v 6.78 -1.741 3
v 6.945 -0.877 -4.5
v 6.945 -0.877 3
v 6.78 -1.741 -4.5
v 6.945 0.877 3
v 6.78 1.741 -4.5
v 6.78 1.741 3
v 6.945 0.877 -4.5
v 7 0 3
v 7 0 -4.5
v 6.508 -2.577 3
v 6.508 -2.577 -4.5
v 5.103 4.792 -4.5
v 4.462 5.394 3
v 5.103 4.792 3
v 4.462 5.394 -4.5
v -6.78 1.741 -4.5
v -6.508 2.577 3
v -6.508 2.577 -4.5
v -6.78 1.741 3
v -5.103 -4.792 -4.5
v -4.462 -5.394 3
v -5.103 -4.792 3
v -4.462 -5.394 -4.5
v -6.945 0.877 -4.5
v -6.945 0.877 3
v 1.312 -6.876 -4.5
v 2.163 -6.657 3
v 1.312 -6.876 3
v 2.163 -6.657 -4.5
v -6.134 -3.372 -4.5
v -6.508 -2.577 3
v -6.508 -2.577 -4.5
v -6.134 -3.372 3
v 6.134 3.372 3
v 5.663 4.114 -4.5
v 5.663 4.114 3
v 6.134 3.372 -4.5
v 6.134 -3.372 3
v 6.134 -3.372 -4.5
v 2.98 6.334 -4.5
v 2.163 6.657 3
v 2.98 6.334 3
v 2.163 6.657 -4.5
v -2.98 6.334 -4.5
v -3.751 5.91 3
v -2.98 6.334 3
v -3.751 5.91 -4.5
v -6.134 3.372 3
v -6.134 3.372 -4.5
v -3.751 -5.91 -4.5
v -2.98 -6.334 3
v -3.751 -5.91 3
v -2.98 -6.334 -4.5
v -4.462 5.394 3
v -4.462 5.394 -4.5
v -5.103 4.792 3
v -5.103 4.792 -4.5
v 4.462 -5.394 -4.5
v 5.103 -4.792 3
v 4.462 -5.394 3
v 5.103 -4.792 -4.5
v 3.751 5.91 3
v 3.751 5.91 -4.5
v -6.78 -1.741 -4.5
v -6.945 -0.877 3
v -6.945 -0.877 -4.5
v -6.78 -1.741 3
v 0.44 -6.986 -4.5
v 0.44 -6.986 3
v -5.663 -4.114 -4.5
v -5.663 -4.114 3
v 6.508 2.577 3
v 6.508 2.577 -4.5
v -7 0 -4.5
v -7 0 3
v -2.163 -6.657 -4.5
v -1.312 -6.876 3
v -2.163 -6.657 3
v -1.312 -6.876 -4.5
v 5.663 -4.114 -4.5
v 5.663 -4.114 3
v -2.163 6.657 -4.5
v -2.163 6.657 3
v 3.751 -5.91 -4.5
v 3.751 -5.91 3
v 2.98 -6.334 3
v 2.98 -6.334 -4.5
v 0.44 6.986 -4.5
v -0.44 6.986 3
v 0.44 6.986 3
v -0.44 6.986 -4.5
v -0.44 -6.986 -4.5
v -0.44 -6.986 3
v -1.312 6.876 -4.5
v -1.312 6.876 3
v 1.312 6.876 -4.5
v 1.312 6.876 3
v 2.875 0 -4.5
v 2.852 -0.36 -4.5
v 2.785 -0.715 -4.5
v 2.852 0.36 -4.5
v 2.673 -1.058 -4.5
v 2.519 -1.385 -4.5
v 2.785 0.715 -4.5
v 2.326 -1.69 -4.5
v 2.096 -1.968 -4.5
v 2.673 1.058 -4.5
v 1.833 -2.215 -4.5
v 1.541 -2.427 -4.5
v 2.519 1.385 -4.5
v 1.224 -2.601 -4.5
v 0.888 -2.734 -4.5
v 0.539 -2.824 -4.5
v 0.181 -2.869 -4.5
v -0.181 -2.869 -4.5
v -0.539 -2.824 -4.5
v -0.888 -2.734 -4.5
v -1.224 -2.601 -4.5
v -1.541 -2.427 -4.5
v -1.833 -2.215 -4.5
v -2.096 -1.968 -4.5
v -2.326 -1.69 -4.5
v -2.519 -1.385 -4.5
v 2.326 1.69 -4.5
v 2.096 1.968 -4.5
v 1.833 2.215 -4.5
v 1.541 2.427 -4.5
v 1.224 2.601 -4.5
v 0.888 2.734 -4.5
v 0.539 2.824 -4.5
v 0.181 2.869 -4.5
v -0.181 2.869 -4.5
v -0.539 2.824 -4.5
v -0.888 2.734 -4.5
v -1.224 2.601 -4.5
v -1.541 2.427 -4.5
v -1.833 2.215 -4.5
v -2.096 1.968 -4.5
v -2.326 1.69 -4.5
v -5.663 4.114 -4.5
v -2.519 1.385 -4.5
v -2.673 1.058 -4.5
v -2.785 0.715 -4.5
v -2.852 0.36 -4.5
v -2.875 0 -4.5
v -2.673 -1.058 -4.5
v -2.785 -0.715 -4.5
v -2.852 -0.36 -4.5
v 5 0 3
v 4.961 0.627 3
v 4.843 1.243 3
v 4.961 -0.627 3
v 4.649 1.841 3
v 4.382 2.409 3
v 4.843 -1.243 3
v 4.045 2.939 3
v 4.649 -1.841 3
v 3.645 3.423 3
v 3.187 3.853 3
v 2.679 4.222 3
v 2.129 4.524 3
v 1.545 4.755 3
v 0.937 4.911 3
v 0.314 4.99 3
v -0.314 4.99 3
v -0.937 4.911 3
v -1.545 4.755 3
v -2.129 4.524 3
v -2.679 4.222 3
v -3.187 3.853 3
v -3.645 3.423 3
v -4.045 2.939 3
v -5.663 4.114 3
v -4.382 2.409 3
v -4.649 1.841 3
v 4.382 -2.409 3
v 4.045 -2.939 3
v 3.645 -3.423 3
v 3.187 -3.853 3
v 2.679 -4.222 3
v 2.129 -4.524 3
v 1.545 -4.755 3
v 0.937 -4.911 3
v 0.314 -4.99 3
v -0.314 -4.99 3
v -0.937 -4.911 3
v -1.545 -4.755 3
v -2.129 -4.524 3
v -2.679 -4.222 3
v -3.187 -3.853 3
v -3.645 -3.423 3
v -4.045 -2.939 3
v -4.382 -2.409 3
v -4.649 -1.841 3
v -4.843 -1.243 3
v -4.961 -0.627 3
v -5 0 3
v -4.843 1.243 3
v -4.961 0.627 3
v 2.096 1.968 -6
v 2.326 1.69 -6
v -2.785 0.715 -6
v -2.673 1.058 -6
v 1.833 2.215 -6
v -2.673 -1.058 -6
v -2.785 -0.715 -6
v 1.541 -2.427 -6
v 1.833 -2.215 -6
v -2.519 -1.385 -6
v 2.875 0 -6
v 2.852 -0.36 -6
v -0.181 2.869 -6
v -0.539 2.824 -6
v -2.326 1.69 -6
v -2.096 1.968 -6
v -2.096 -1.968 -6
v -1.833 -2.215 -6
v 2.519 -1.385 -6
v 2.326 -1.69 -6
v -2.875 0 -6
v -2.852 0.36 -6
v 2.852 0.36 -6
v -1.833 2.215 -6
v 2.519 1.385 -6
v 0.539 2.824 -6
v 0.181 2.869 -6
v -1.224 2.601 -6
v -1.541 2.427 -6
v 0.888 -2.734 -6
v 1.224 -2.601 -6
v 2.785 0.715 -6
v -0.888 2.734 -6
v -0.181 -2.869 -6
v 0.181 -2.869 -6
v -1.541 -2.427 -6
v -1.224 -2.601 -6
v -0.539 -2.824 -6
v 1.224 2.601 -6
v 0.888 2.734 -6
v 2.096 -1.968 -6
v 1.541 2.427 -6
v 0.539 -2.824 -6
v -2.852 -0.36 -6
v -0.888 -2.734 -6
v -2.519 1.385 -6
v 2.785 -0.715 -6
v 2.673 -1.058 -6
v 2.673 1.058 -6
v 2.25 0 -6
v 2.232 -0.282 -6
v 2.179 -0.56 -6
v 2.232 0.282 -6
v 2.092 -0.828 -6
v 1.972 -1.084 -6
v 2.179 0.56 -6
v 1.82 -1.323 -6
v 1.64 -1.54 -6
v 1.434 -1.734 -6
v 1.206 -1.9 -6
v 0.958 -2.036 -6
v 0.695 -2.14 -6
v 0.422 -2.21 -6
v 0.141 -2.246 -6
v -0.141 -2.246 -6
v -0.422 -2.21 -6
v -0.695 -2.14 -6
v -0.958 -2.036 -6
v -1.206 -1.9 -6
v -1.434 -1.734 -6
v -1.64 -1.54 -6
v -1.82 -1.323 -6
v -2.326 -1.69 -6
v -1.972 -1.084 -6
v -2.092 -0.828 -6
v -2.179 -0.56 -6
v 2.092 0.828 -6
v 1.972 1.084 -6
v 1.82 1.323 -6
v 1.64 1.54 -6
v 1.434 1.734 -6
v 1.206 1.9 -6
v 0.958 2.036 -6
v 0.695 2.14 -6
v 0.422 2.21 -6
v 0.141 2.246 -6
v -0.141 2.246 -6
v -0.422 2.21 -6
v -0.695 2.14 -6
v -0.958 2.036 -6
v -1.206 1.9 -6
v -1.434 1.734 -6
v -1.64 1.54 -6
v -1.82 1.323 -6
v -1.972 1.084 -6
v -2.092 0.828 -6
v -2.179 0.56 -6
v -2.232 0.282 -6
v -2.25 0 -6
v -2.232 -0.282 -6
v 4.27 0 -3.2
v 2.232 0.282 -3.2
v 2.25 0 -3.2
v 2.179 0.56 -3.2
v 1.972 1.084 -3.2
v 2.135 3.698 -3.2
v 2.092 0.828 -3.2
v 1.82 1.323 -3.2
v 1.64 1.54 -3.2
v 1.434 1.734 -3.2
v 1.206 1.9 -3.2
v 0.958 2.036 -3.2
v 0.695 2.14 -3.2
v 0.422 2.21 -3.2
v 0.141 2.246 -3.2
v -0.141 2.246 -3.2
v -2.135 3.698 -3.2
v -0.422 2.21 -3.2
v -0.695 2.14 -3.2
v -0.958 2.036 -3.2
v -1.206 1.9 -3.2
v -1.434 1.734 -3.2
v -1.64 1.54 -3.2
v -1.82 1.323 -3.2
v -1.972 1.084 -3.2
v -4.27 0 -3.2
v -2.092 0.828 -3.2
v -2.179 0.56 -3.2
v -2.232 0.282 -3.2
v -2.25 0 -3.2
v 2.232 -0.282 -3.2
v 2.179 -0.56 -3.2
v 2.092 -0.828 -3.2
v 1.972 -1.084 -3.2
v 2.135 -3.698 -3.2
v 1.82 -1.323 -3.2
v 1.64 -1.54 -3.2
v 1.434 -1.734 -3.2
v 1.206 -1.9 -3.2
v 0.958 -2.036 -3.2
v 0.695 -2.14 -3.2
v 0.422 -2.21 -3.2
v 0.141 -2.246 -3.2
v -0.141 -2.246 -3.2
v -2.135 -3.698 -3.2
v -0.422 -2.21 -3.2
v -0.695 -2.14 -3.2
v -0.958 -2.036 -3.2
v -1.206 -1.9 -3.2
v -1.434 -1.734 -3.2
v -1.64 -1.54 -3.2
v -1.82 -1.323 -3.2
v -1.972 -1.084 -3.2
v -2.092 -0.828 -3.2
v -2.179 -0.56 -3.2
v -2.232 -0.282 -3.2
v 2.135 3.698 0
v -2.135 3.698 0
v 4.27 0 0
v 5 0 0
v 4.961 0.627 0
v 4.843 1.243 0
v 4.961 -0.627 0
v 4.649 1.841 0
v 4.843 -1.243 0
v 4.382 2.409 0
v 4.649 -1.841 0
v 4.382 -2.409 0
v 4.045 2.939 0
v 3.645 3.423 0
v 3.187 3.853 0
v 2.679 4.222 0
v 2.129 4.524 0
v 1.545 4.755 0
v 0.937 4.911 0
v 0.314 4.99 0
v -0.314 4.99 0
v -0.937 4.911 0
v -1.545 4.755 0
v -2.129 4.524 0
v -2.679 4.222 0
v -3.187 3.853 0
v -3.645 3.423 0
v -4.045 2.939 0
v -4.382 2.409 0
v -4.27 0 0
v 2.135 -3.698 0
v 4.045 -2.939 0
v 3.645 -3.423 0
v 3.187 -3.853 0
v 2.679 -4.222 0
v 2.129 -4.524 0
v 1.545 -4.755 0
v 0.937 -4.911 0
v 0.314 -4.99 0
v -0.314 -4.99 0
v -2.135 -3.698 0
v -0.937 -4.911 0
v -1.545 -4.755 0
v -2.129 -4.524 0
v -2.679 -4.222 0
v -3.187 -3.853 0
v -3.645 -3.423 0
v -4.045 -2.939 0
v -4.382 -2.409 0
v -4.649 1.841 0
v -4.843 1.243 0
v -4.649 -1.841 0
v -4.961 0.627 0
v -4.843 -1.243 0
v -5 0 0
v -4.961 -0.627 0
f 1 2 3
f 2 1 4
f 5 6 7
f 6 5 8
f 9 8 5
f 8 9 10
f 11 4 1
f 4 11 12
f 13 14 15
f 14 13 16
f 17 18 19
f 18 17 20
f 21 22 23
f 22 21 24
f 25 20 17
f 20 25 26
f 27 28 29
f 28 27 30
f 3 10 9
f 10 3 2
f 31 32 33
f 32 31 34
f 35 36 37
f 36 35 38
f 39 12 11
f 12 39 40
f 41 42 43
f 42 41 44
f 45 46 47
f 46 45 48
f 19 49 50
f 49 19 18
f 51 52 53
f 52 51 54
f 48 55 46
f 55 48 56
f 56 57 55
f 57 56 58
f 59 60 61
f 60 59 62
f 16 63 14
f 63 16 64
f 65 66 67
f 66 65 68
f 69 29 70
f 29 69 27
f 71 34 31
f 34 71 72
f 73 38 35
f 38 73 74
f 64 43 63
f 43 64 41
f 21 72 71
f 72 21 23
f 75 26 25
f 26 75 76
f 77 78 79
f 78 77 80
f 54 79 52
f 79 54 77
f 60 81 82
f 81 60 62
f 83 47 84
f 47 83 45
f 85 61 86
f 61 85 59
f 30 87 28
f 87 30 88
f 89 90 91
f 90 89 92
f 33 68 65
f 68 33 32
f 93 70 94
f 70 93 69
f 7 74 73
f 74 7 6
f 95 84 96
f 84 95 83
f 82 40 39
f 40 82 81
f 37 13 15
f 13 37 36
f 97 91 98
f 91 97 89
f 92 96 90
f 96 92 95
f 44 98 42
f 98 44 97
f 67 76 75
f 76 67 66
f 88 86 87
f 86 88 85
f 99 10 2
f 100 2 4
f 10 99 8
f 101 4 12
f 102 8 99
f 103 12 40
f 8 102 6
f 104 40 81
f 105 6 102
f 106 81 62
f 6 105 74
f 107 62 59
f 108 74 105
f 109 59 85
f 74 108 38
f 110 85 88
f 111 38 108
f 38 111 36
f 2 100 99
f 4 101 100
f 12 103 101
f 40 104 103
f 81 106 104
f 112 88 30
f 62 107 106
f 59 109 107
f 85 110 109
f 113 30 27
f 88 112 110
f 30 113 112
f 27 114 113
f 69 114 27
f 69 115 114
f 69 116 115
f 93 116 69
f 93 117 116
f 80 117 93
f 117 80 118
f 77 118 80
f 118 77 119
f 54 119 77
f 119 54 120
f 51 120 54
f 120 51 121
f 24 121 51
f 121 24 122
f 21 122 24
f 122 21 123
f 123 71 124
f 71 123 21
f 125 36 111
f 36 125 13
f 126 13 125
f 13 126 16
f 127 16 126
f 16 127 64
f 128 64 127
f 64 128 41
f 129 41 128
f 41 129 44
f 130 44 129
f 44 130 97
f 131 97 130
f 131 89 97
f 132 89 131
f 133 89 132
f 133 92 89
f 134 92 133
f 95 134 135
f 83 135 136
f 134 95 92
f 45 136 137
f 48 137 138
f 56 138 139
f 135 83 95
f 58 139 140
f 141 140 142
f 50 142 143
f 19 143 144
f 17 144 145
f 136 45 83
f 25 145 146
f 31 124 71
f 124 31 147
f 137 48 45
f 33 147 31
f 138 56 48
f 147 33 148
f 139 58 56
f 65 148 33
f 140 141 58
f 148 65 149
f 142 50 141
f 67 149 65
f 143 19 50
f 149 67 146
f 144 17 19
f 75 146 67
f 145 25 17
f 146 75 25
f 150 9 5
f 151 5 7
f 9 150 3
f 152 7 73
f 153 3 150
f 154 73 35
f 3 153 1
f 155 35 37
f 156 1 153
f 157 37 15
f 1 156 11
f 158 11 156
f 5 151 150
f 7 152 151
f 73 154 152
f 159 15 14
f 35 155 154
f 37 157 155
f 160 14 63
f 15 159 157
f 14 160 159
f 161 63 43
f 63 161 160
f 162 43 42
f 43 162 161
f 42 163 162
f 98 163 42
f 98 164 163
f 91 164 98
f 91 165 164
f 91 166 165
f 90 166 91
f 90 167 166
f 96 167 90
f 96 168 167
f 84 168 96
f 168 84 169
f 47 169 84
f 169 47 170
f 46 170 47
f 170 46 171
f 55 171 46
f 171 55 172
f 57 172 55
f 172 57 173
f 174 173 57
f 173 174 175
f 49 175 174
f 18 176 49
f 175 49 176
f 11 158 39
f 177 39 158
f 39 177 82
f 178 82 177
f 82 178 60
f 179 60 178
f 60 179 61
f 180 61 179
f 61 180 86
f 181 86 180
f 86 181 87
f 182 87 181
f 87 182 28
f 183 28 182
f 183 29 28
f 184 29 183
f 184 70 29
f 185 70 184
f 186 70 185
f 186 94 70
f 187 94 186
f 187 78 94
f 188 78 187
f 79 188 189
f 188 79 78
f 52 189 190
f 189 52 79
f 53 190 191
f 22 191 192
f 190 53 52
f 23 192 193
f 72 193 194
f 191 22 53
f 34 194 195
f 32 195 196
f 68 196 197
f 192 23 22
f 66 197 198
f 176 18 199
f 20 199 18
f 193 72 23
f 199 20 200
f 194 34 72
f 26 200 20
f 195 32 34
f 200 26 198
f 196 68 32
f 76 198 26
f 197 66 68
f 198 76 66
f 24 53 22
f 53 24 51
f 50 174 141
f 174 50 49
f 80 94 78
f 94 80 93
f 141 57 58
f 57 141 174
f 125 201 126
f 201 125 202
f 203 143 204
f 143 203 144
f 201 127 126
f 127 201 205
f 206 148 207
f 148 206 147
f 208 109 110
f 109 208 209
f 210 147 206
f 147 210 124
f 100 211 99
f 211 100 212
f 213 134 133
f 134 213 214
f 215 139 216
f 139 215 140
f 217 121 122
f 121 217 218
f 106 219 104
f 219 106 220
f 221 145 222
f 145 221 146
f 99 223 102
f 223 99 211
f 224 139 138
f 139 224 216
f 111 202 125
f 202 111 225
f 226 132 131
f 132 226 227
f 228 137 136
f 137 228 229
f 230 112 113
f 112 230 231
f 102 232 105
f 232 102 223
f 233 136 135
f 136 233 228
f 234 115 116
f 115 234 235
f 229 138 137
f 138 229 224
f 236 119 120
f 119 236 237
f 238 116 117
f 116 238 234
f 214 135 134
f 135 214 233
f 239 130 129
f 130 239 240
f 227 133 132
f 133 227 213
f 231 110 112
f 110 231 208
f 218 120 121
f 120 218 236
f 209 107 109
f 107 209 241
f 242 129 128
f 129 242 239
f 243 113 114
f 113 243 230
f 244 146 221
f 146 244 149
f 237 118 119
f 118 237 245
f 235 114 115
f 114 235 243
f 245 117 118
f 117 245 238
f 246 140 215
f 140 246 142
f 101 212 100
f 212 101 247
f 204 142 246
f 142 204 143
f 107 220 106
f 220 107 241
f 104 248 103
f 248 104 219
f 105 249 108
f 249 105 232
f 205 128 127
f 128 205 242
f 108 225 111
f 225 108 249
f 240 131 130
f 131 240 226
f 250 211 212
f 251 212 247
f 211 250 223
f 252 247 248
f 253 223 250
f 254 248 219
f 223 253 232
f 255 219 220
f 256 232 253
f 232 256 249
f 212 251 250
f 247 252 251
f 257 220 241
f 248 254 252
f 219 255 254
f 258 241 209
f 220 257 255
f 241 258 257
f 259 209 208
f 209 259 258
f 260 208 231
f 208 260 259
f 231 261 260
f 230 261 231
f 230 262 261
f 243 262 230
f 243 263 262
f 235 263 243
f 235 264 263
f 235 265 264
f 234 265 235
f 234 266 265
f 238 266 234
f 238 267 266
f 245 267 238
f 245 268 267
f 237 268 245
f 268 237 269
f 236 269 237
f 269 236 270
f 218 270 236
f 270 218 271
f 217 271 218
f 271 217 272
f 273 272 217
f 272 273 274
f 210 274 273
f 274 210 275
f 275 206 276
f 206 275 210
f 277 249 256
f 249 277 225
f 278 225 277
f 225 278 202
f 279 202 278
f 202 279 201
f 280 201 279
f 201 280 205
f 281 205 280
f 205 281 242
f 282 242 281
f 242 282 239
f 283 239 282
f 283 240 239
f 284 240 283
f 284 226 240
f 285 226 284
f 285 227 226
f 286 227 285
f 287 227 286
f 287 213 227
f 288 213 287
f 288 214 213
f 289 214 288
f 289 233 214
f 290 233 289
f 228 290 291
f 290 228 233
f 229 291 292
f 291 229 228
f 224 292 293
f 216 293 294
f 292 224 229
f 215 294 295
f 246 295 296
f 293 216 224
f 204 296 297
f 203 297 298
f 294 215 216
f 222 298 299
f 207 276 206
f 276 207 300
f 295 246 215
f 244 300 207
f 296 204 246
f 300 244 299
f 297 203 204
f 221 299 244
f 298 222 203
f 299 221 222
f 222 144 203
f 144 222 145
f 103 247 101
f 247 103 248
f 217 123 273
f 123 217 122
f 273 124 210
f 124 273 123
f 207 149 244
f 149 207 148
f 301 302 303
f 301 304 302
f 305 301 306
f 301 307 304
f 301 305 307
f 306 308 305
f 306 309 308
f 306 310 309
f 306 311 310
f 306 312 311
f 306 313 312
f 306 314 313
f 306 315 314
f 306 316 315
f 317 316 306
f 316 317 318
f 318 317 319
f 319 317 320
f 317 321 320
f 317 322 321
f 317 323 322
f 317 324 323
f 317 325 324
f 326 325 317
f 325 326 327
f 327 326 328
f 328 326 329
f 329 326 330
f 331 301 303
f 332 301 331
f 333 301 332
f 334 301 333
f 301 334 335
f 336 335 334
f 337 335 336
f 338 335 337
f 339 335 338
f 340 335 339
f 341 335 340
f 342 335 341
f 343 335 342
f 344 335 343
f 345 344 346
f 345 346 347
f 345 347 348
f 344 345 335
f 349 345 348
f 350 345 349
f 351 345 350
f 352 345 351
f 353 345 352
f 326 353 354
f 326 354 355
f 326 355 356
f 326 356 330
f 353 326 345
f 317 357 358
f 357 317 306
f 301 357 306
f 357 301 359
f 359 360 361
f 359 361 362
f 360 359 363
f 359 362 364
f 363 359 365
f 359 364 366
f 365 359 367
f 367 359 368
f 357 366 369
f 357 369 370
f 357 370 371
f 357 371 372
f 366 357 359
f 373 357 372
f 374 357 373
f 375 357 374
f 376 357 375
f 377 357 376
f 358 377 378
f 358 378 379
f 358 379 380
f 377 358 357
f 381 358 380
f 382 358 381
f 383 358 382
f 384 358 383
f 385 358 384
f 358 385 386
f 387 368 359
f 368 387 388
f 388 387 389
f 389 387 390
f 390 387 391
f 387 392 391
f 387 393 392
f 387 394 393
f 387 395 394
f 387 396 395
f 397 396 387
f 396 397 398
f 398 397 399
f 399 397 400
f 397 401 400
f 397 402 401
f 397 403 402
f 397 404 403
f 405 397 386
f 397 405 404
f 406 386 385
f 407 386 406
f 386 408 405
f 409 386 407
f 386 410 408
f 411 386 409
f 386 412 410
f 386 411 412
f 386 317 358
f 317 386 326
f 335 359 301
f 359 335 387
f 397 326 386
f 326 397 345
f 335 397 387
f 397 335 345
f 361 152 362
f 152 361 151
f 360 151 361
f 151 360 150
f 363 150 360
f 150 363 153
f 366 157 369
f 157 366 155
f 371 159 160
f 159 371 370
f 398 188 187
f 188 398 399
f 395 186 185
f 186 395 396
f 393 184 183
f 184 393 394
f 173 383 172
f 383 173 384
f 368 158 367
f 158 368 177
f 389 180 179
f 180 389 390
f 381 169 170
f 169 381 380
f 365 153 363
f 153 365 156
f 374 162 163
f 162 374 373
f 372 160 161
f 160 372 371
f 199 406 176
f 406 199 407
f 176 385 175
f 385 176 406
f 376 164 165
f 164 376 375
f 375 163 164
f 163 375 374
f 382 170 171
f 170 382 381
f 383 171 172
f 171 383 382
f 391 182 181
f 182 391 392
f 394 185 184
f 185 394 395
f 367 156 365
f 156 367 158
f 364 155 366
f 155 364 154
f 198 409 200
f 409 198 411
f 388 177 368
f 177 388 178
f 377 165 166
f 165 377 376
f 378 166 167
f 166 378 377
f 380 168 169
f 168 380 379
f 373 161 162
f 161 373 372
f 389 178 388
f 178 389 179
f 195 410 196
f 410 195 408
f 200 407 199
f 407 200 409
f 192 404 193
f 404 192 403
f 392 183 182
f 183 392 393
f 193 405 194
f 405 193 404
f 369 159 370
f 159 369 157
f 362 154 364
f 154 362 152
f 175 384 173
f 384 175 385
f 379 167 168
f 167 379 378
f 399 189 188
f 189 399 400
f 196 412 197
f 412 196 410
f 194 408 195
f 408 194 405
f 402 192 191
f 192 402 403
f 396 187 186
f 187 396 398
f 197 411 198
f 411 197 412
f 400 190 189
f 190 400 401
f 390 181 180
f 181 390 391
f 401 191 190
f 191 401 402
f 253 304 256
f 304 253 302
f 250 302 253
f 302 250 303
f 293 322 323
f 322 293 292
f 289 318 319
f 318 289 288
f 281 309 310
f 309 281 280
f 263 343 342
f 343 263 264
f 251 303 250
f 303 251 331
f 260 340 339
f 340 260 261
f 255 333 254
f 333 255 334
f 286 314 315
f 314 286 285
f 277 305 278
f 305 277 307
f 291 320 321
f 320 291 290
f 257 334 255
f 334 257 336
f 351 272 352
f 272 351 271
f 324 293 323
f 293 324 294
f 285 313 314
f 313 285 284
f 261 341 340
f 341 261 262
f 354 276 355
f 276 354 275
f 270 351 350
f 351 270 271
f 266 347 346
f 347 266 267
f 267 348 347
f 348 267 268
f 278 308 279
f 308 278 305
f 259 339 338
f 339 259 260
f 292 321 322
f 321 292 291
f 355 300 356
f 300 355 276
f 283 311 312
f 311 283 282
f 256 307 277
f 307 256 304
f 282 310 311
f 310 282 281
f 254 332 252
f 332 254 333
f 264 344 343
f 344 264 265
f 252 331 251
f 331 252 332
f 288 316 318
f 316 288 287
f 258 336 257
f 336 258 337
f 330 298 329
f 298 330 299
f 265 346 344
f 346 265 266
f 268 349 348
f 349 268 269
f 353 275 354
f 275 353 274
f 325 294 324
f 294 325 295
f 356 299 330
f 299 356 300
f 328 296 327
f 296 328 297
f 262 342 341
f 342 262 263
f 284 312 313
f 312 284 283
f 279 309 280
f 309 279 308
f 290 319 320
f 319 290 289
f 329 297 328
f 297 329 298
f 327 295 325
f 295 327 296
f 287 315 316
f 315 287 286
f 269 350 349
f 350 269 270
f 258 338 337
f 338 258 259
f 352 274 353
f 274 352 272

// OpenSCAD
$fn = 50;


difference() {
	union() {
		translate(v = [0, 0, -4.5000000000]) {
			cylinder(h = 7.5000000000, r = 7.0000000000);
		}
		#translate(v = [0, 0, -6.0000000000]) {
			cylinder(h = 6, r = 2.8750000000);
		}
	}
	union() {
		translate(v = [0, 0, 0]) {
			rotate(a = [0, 0, 0]) {
				difference() {
					union() {
						translate(v = [0, 0, -3.2000000000]) {
							linear_extrude(height = 3.2000000000) {
								polygon(points = [[4.2698000000, 0.0000000000], [2.1349000000, 3.6977552691], [-2.1349000000, 3.6977552691], [-4.2698000000, 0.0000000000], [-2.1349000000, -3.6977552691], [2.1349000000, -3.6977552691]]);
							}
						}
					}
					union();
				}
			}
		}
		#cylinder(h = 3, r = 5.0000000000);
		#translate(v = [0, 0, -100.0000000000]) {
			cylinder(h = 200, r = 2.2500000000);
		}
	}
}
